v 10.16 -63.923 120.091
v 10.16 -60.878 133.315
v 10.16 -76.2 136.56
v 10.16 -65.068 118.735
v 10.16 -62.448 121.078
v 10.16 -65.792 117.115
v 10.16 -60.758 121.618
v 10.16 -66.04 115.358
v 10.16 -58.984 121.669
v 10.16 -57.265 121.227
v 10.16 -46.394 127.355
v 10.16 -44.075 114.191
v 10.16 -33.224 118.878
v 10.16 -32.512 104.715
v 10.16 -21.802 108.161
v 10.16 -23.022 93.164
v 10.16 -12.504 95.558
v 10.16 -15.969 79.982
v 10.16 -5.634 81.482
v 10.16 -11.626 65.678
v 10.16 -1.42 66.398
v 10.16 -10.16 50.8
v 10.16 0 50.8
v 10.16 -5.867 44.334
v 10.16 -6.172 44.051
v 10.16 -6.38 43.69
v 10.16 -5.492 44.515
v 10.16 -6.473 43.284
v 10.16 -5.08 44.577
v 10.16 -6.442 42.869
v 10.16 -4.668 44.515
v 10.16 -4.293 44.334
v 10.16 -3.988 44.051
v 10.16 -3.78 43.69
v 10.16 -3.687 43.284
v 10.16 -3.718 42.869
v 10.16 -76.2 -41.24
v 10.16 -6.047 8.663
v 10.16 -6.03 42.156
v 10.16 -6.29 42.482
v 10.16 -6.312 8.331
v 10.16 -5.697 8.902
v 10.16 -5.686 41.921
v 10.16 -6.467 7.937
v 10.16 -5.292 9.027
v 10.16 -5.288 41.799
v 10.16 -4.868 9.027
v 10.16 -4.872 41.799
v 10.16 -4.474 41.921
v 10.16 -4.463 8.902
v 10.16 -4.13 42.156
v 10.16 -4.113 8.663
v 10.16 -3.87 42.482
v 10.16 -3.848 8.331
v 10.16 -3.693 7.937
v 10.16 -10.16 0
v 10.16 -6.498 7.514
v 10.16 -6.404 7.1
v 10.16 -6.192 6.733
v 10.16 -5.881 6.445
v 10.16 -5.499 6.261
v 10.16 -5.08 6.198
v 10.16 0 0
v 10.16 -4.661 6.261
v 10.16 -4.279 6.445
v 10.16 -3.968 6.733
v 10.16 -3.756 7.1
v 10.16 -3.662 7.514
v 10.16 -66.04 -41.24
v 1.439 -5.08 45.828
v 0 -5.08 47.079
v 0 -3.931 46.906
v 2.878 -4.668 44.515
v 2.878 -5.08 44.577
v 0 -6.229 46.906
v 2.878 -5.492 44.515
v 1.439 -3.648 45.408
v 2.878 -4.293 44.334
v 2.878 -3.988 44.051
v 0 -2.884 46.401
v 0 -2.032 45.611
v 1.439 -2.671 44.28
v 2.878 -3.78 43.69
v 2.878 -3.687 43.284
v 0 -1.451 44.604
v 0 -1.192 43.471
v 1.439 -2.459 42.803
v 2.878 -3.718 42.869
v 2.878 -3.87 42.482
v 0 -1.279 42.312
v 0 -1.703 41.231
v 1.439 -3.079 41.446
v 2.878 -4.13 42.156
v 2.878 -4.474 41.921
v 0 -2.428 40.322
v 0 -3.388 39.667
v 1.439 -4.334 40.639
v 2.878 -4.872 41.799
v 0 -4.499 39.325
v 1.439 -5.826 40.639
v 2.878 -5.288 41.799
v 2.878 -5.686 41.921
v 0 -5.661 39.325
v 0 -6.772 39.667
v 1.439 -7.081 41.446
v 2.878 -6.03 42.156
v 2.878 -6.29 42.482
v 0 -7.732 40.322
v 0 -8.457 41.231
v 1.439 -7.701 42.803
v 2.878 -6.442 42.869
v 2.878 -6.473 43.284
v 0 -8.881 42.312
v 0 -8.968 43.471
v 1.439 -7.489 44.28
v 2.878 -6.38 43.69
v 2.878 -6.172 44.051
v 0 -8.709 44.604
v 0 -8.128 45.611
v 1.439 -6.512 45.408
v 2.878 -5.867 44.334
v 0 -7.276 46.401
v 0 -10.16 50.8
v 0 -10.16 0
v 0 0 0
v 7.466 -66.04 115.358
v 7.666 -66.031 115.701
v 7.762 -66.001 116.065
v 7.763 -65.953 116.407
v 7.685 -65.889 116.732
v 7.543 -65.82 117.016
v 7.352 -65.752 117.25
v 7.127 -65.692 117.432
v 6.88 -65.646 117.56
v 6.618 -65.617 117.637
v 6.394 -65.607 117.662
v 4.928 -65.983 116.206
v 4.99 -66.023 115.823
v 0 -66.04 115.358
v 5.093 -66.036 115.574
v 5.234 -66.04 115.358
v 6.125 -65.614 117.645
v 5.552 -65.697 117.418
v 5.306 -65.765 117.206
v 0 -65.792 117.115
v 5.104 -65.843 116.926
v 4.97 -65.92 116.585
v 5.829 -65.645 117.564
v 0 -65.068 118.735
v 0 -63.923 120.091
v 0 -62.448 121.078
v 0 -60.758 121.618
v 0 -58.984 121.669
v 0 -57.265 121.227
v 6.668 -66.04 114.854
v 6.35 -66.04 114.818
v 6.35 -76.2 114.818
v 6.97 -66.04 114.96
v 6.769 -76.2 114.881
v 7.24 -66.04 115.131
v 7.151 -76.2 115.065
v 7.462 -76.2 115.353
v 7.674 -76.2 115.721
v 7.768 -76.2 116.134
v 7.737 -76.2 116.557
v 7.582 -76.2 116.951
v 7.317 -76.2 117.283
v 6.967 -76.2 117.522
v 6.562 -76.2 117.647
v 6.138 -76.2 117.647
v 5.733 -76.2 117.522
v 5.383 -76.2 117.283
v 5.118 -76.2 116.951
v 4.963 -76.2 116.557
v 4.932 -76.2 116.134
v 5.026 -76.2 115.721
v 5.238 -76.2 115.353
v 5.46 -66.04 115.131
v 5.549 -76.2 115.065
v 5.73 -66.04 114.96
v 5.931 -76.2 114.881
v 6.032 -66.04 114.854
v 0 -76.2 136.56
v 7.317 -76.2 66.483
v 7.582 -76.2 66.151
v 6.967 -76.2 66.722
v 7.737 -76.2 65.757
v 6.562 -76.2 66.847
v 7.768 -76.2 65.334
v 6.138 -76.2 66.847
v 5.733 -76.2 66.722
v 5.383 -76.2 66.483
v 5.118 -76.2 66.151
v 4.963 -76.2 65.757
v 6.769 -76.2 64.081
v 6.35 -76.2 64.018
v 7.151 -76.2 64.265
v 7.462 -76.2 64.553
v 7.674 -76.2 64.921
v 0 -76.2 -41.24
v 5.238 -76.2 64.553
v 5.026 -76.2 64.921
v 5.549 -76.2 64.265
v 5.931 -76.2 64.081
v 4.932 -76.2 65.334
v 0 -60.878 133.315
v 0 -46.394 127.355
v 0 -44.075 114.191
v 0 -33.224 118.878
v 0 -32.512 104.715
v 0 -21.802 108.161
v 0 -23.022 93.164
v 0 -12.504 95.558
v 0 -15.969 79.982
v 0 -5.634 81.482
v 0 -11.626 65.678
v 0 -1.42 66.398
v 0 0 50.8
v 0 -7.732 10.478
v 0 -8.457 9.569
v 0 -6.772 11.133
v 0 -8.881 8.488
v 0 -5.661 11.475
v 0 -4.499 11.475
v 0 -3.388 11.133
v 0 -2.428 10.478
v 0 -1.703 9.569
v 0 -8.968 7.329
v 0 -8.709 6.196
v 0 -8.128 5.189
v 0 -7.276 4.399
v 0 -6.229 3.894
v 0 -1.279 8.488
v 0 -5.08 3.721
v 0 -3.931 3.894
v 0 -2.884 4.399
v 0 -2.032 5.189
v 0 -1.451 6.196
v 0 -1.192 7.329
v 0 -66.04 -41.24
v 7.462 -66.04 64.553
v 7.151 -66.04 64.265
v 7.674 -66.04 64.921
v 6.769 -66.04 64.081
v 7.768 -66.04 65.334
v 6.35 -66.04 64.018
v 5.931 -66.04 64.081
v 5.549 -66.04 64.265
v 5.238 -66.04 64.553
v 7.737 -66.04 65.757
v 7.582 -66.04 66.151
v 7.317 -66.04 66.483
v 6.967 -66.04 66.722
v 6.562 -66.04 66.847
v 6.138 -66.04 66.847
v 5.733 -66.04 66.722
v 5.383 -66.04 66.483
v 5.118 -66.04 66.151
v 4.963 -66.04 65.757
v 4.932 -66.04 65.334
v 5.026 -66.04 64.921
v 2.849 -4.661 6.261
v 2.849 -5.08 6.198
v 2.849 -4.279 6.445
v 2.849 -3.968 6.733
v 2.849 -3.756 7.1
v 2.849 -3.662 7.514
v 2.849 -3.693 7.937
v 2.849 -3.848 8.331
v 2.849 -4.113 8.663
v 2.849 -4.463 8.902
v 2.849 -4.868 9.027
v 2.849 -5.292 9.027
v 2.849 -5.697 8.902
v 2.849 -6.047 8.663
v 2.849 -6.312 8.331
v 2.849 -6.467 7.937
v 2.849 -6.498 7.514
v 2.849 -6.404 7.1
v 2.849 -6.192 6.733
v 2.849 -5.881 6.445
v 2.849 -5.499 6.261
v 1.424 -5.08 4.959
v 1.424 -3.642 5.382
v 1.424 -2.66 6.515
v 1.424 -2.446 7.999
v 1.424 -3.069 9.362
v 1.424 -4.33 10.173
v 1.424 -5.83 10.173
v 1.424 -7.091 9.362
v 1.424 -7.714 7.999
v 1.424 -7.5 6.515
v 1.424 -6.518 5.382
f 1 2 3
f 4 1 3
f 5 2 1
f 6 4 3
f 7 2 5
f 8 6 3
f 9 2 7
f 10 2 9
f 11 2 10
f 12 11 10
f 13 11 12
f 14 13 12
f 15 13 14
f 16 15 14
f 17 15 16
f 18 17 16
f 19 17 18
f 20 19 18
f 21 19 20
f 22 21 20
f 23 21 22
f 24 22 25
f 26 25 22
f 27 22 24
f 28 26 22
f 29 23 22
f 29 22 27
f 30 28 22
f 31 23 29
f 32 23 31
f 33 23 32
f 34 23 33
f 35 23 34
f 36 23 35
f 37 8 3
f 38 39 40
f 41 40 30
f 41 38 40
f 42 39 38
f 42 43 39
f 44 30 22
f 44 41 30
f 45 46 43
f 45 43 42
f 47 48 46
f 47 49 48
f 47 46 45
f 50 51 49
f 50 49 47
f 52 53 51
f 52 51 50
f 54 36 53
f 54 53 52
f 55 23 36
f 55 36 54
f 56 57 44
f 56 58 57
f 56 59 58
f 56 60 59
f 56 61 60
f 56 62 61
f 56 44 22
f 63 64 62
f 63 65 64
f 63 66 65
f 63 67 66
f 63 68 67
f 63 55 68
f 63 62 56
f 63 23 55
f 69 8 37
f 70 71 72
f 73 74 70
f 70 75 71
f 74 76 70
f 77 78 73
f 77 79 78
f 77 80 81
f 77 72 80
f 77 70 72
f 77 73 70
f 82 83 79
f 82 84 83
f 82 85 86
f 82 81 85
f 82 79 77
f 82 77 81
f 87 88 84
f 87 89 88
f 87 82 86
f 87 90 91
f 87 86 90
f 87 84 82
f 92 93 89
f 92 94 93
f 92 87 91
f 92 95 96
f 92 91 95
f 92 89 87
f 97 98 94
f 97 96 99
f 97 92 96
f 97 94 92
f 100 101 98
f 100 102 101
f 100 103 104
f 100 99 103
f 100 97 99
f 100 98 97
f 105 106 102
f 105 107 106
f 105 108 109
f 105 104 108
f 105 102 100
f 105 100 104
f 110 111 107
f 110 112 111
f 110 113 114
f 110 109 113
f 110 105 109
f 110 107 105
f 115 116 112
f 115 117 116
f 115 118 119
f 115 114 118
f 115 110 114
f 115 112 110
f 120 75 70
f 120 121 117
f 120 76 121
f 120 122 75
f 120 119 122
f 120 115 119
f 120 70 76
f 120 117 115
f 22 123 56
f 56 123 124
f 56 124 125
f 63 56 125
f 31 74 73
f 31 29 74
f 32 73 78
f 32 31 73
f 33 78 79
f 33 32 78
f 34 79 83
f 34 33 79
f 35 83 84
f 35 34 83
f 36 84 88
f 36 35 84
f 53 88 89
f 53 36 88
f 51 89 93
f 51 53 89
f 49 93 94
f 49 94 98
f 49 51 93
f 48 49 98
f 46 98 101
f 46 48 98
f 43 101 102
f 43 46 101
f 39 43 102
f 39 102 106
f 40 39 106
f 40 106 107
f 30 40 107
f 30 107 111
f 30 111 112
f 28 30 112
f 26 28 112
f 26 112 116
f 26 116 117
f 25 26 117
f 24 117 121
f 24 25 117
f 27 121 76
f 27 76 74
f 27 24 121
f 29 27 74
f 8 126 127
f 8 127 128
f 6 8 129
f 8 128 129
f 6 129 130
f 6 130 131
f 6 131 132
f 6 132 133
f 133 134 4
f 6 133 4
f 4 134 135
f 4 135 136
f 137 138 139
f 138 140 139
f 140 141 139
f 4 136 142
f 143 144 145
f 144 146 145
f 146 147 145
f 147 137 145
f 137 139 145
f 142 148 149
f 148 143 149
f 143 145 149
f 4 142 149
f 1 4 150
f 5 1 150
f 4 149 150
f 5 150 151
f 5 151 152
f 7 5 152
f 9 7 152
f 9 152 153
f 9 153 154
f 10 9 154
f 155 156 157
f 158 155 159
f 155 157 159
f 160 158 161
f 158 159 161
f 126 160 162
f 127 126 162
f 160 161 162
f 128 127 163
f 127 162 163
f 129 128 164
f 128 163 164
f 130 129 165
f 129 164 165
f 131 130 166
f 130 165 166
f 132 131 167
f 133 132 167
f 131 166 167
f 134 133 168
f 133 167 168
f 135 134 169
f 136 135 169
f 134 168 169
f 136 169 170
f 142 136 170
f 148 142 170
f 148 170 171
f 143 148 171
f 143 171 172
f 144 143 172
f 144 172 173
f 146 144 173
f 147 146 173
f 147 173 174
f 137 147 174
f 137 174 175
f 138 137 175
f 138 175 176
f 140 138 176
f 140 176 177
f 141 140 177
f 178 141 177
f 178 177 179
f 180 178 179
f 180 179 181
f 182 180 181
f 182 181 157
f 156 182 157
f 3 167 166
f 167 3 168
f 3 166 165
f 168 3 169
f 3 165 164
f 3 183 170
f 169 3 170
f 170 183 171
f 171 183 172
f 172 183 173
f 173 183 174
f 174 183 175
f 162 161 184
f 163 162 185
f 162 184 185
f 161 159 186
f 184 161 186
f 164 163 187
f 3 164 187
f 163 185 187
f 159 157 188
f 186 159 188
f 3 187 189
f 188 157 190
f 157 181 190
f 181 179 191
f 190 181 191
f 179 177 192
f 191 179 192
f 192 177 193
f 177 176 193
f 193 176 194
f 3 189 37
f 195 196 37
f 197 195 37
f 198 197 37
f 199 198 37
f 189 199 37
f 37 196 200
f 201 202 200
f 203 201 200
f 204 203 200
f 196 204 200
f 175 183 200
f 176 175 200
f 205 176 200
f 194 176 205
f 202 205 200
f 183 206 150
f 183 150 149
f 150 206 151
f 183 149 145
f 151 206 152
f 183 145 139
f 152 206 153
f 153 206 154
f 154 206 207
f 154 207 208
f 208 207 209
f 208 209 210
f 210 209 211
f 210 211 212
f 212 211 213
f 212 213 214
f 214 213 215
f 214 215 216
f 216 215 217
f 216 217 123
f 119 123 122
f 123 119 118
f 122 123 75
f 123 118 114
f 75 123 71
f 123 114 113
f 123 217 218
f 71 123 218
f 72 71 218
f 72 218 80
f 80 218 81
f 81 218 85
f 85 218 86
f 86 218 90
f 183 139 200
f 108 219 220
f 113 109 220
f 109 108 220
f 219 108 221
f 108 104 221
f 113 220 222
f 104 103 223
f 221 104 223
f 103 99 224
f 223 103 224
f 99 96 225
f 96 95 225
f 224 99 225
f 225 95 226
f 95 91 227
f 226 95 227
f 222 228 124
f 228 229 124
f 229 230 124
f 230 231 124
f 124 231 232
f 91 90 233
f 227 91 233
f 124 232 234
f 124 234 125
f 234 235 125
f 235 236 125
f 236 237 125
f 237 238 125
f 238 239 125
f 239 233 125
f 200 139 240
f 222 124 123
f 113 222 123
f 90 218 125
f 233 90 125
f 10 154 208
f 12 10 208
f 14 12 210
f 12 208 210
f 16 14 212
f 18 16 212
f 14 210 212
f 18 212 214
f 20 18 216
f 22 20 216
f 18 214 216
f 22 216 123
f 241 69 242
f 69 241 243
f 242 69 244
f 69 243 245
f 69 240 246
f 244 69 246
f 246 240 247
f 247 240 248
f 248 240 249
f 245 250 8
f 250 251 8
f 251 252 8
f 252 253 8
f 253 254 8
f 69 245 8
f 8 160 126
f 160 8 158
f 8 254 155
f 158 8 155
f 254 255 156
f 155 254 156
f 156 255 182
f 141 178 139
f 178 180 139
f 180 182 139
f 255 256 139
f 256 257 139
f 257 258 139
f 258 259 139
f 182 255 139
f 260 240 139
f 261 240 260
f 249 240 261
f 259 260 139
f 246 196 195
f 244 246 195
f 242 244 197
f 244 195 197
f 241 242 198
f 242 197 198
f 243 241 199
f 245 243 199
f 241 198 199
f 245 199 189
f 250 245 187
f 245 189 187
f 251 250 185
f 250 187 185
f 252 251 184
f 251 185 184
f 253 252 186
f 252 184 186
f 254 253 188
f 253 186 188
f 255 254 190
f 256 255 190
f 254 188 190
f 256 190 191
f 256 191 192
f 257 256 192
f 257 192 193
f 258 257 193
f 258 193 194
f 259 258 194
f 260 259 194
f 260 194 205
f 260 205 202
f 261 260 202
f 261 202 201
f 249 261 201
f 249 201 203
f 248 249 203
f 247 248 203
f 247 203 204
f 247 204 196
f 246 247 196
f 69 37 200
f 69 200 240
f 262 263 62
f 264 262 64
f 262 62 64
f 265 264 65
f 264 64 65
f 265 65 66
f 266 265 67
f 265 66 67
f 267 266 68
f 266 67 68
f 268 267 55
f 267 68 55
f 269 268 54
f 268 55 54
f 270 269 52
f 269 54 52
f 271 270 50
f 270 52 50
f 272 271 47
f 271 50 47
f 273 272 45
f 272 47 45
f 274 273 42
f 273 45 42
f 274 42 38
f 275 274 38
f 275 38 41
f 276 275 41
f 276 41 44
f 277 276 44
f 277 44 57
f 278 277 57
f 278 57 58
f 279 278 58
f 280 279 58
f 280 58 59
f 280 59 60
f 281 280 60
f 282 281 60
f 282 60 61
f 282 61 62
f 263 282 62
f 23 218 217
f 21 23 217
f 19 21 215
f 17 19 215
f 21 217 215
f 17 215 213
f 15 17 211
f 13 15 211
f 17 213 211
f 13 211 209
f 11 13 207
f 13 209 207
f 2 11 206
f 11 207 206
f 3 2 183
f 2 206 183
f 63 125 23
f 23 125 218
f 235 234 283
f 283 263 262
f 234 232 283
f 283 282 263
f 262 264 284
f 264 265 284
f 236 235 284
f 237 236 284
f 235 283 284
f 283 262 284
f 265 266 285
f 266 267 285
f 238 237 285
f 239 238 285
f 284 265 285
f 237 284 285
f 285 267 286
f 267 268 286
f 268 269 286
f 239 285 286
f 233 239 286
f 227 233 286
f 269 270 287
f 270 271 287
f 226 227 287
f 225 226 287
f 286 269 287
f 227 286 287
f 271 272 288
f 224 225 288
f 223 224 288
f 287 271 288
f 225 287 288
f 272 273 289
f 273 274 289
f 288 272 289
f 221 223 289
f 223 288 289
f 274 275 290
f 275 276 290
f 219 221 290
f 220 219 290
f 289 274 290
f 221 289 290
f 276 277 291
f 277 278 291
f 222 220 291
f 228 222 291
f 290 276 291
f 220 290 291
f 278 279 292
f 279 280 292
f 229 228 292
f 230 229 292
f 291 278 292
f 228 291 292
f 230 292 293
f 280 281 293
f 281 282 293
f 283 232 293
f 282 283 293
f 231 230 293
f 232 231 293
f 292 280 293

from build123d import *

# Parameters (mm, degrees)
BOSS_EXTRUDE1_DEPTH                               = 10.16
SKETCH2_R                                         = 1.4224
CUT_EXTRUDE2_DEPTH                                = 157.71111347
CUT_EXTRUDE3_REACH                                = 158.711
SKETCH3_R                                         = 1.4224
CSK_FOR_3_FLAT_HEAD_MACHINE_SCREW_100_D           = 2.794
CSK_FOR_3_FLAT_HEAD_MACHINE_SCREW_100_CSINK_D     = 7.7978
CSK_FOR_3_FLAT_HEAD_MACHINE_SCREW_100_CSINK_ANGLE = 82


with BuildPart() as part:
    # Sketch1 → Boss-Extrude1 (new body)
    with BuildSketch(Plane(origin=(0, 0, 0), x_dir=(0, 0, -1), z_dir=(1, 0, 0))):
        with BuildLine():
            Line((-136.560270522, -76.2), (41.239729478, -76.2))
            Line((41.239729478, -76.2), (41.239729478, -66.04))
            Line((41.239729478, -66.04), (-115.357986338, -66.04))
            ThreePointArc((-115.357986338, -66.04), (-120.636166121, -63.220342502), (-121.226894187, -57.265454545))
            ThreePointArc((-121.226894187, -57.265454545), (-93.164110025, -23.021842608), (-50.8, -10.16))
            Line((-50.8, -10.16), (0, -10.16))
            Line((0, -10.16), (0, 0))
            Line((0, 0), (-50.8, 0))
            ThreePointArc((-50.8, 0), (-108.161276136, -21.802013662), (-136.560270522, -76.2))
        make_face()
    extrude(amount=BOSS_EXTRUDE1_DEPTH)

    # Sketch2 → Cut-Extrude2 (cut, through all)
    with BuildSketch(Plane(origin=(10.16, 0, 0), x_dir=(0, 0, -1), z_dir=(1, 0, 0))):
        with Locations((-7.62, -5.08)):
            Circle(SKETCH2_R)
    extrude(amount=-CUT_EXTRUDE2_DEPTH, mode=Mode.SUBTRACT)

    # Sketch3 → Cut-Extrude3 (cut, up to next)
    with BuildSketch(Plane.XZ.offset(76.2), mode=Mode.PRIVATE) as cut_extrude3_sk1:
        with Locations(Location((6.35, 116.240270522, 0), (0, 0, 270))):
            Circle(SKETCH3_R)
    cut_extrude3_tool1 = extrude(cut_extrude3_sk1.sketch, amount=-CUT_EXTRUDE3_REACH, mode=Mode.PRIVATE) & part.part
    # Sketch3 → Cut-Extrude3 (cut, up to next)
    with BuildSketch(Plane.XZ.offset(76.2), mode=Mode.PRIVATE) as cut_extrude3_sk2:
        with Locations(Location((6.35, 65.440270522, 0), (0, 0, 270))):
            Circle(SKETCH3_R)
    cut_extrude3_tool2 = extrude(cut_extrude3_sk2.sketch, amount=-CUT_EXTRUDE3_REACH, mode=Mode.PRIVATE) & part.part
    add(cut_extrude3_tool1.solids().sort_by_distance((6.35, -76.2, 116.240271))[0], mode=Mode.SUBTRACT)
    add(cut_extrude3_tool2.solids().sort_by_distance((6.35, -76.2, 65.440271))[0], mode=Mode.SUBTRACT)

    # CSK for #3 Flat Head Machine Screw (100)1 (through all)
    with Locations(Plane.ZY):
        with Locations((7.62, -5.08)):
            csk_for_3_flat_head_machine_screw_100 = CounterSinkHole(CSK_FOR_3_FLAT_HEAD_MACHINE_SCREW_100_D / 2, CSK_FOR_3_FLAT_HEAD_MACHINE_SCREW_100_CSINK_D / 2, counter_sink_angle=CSK_FOR_3_FLAT_HEAD_MACHINE_SCREW_100_CSINK_ANGLE)

    # Mirror1: CSK for #3 Flat Head Machine Screw (100)1 across plane
    add(csk_for_3_flat_head_machine_screw_100.mirror(Plane(origin=(0, 0, 25.4), x_dir=(1, 0, 0), z_dir=(0, 0, -1))), mode=Mode.SUBTRACT)


solid = part.part
